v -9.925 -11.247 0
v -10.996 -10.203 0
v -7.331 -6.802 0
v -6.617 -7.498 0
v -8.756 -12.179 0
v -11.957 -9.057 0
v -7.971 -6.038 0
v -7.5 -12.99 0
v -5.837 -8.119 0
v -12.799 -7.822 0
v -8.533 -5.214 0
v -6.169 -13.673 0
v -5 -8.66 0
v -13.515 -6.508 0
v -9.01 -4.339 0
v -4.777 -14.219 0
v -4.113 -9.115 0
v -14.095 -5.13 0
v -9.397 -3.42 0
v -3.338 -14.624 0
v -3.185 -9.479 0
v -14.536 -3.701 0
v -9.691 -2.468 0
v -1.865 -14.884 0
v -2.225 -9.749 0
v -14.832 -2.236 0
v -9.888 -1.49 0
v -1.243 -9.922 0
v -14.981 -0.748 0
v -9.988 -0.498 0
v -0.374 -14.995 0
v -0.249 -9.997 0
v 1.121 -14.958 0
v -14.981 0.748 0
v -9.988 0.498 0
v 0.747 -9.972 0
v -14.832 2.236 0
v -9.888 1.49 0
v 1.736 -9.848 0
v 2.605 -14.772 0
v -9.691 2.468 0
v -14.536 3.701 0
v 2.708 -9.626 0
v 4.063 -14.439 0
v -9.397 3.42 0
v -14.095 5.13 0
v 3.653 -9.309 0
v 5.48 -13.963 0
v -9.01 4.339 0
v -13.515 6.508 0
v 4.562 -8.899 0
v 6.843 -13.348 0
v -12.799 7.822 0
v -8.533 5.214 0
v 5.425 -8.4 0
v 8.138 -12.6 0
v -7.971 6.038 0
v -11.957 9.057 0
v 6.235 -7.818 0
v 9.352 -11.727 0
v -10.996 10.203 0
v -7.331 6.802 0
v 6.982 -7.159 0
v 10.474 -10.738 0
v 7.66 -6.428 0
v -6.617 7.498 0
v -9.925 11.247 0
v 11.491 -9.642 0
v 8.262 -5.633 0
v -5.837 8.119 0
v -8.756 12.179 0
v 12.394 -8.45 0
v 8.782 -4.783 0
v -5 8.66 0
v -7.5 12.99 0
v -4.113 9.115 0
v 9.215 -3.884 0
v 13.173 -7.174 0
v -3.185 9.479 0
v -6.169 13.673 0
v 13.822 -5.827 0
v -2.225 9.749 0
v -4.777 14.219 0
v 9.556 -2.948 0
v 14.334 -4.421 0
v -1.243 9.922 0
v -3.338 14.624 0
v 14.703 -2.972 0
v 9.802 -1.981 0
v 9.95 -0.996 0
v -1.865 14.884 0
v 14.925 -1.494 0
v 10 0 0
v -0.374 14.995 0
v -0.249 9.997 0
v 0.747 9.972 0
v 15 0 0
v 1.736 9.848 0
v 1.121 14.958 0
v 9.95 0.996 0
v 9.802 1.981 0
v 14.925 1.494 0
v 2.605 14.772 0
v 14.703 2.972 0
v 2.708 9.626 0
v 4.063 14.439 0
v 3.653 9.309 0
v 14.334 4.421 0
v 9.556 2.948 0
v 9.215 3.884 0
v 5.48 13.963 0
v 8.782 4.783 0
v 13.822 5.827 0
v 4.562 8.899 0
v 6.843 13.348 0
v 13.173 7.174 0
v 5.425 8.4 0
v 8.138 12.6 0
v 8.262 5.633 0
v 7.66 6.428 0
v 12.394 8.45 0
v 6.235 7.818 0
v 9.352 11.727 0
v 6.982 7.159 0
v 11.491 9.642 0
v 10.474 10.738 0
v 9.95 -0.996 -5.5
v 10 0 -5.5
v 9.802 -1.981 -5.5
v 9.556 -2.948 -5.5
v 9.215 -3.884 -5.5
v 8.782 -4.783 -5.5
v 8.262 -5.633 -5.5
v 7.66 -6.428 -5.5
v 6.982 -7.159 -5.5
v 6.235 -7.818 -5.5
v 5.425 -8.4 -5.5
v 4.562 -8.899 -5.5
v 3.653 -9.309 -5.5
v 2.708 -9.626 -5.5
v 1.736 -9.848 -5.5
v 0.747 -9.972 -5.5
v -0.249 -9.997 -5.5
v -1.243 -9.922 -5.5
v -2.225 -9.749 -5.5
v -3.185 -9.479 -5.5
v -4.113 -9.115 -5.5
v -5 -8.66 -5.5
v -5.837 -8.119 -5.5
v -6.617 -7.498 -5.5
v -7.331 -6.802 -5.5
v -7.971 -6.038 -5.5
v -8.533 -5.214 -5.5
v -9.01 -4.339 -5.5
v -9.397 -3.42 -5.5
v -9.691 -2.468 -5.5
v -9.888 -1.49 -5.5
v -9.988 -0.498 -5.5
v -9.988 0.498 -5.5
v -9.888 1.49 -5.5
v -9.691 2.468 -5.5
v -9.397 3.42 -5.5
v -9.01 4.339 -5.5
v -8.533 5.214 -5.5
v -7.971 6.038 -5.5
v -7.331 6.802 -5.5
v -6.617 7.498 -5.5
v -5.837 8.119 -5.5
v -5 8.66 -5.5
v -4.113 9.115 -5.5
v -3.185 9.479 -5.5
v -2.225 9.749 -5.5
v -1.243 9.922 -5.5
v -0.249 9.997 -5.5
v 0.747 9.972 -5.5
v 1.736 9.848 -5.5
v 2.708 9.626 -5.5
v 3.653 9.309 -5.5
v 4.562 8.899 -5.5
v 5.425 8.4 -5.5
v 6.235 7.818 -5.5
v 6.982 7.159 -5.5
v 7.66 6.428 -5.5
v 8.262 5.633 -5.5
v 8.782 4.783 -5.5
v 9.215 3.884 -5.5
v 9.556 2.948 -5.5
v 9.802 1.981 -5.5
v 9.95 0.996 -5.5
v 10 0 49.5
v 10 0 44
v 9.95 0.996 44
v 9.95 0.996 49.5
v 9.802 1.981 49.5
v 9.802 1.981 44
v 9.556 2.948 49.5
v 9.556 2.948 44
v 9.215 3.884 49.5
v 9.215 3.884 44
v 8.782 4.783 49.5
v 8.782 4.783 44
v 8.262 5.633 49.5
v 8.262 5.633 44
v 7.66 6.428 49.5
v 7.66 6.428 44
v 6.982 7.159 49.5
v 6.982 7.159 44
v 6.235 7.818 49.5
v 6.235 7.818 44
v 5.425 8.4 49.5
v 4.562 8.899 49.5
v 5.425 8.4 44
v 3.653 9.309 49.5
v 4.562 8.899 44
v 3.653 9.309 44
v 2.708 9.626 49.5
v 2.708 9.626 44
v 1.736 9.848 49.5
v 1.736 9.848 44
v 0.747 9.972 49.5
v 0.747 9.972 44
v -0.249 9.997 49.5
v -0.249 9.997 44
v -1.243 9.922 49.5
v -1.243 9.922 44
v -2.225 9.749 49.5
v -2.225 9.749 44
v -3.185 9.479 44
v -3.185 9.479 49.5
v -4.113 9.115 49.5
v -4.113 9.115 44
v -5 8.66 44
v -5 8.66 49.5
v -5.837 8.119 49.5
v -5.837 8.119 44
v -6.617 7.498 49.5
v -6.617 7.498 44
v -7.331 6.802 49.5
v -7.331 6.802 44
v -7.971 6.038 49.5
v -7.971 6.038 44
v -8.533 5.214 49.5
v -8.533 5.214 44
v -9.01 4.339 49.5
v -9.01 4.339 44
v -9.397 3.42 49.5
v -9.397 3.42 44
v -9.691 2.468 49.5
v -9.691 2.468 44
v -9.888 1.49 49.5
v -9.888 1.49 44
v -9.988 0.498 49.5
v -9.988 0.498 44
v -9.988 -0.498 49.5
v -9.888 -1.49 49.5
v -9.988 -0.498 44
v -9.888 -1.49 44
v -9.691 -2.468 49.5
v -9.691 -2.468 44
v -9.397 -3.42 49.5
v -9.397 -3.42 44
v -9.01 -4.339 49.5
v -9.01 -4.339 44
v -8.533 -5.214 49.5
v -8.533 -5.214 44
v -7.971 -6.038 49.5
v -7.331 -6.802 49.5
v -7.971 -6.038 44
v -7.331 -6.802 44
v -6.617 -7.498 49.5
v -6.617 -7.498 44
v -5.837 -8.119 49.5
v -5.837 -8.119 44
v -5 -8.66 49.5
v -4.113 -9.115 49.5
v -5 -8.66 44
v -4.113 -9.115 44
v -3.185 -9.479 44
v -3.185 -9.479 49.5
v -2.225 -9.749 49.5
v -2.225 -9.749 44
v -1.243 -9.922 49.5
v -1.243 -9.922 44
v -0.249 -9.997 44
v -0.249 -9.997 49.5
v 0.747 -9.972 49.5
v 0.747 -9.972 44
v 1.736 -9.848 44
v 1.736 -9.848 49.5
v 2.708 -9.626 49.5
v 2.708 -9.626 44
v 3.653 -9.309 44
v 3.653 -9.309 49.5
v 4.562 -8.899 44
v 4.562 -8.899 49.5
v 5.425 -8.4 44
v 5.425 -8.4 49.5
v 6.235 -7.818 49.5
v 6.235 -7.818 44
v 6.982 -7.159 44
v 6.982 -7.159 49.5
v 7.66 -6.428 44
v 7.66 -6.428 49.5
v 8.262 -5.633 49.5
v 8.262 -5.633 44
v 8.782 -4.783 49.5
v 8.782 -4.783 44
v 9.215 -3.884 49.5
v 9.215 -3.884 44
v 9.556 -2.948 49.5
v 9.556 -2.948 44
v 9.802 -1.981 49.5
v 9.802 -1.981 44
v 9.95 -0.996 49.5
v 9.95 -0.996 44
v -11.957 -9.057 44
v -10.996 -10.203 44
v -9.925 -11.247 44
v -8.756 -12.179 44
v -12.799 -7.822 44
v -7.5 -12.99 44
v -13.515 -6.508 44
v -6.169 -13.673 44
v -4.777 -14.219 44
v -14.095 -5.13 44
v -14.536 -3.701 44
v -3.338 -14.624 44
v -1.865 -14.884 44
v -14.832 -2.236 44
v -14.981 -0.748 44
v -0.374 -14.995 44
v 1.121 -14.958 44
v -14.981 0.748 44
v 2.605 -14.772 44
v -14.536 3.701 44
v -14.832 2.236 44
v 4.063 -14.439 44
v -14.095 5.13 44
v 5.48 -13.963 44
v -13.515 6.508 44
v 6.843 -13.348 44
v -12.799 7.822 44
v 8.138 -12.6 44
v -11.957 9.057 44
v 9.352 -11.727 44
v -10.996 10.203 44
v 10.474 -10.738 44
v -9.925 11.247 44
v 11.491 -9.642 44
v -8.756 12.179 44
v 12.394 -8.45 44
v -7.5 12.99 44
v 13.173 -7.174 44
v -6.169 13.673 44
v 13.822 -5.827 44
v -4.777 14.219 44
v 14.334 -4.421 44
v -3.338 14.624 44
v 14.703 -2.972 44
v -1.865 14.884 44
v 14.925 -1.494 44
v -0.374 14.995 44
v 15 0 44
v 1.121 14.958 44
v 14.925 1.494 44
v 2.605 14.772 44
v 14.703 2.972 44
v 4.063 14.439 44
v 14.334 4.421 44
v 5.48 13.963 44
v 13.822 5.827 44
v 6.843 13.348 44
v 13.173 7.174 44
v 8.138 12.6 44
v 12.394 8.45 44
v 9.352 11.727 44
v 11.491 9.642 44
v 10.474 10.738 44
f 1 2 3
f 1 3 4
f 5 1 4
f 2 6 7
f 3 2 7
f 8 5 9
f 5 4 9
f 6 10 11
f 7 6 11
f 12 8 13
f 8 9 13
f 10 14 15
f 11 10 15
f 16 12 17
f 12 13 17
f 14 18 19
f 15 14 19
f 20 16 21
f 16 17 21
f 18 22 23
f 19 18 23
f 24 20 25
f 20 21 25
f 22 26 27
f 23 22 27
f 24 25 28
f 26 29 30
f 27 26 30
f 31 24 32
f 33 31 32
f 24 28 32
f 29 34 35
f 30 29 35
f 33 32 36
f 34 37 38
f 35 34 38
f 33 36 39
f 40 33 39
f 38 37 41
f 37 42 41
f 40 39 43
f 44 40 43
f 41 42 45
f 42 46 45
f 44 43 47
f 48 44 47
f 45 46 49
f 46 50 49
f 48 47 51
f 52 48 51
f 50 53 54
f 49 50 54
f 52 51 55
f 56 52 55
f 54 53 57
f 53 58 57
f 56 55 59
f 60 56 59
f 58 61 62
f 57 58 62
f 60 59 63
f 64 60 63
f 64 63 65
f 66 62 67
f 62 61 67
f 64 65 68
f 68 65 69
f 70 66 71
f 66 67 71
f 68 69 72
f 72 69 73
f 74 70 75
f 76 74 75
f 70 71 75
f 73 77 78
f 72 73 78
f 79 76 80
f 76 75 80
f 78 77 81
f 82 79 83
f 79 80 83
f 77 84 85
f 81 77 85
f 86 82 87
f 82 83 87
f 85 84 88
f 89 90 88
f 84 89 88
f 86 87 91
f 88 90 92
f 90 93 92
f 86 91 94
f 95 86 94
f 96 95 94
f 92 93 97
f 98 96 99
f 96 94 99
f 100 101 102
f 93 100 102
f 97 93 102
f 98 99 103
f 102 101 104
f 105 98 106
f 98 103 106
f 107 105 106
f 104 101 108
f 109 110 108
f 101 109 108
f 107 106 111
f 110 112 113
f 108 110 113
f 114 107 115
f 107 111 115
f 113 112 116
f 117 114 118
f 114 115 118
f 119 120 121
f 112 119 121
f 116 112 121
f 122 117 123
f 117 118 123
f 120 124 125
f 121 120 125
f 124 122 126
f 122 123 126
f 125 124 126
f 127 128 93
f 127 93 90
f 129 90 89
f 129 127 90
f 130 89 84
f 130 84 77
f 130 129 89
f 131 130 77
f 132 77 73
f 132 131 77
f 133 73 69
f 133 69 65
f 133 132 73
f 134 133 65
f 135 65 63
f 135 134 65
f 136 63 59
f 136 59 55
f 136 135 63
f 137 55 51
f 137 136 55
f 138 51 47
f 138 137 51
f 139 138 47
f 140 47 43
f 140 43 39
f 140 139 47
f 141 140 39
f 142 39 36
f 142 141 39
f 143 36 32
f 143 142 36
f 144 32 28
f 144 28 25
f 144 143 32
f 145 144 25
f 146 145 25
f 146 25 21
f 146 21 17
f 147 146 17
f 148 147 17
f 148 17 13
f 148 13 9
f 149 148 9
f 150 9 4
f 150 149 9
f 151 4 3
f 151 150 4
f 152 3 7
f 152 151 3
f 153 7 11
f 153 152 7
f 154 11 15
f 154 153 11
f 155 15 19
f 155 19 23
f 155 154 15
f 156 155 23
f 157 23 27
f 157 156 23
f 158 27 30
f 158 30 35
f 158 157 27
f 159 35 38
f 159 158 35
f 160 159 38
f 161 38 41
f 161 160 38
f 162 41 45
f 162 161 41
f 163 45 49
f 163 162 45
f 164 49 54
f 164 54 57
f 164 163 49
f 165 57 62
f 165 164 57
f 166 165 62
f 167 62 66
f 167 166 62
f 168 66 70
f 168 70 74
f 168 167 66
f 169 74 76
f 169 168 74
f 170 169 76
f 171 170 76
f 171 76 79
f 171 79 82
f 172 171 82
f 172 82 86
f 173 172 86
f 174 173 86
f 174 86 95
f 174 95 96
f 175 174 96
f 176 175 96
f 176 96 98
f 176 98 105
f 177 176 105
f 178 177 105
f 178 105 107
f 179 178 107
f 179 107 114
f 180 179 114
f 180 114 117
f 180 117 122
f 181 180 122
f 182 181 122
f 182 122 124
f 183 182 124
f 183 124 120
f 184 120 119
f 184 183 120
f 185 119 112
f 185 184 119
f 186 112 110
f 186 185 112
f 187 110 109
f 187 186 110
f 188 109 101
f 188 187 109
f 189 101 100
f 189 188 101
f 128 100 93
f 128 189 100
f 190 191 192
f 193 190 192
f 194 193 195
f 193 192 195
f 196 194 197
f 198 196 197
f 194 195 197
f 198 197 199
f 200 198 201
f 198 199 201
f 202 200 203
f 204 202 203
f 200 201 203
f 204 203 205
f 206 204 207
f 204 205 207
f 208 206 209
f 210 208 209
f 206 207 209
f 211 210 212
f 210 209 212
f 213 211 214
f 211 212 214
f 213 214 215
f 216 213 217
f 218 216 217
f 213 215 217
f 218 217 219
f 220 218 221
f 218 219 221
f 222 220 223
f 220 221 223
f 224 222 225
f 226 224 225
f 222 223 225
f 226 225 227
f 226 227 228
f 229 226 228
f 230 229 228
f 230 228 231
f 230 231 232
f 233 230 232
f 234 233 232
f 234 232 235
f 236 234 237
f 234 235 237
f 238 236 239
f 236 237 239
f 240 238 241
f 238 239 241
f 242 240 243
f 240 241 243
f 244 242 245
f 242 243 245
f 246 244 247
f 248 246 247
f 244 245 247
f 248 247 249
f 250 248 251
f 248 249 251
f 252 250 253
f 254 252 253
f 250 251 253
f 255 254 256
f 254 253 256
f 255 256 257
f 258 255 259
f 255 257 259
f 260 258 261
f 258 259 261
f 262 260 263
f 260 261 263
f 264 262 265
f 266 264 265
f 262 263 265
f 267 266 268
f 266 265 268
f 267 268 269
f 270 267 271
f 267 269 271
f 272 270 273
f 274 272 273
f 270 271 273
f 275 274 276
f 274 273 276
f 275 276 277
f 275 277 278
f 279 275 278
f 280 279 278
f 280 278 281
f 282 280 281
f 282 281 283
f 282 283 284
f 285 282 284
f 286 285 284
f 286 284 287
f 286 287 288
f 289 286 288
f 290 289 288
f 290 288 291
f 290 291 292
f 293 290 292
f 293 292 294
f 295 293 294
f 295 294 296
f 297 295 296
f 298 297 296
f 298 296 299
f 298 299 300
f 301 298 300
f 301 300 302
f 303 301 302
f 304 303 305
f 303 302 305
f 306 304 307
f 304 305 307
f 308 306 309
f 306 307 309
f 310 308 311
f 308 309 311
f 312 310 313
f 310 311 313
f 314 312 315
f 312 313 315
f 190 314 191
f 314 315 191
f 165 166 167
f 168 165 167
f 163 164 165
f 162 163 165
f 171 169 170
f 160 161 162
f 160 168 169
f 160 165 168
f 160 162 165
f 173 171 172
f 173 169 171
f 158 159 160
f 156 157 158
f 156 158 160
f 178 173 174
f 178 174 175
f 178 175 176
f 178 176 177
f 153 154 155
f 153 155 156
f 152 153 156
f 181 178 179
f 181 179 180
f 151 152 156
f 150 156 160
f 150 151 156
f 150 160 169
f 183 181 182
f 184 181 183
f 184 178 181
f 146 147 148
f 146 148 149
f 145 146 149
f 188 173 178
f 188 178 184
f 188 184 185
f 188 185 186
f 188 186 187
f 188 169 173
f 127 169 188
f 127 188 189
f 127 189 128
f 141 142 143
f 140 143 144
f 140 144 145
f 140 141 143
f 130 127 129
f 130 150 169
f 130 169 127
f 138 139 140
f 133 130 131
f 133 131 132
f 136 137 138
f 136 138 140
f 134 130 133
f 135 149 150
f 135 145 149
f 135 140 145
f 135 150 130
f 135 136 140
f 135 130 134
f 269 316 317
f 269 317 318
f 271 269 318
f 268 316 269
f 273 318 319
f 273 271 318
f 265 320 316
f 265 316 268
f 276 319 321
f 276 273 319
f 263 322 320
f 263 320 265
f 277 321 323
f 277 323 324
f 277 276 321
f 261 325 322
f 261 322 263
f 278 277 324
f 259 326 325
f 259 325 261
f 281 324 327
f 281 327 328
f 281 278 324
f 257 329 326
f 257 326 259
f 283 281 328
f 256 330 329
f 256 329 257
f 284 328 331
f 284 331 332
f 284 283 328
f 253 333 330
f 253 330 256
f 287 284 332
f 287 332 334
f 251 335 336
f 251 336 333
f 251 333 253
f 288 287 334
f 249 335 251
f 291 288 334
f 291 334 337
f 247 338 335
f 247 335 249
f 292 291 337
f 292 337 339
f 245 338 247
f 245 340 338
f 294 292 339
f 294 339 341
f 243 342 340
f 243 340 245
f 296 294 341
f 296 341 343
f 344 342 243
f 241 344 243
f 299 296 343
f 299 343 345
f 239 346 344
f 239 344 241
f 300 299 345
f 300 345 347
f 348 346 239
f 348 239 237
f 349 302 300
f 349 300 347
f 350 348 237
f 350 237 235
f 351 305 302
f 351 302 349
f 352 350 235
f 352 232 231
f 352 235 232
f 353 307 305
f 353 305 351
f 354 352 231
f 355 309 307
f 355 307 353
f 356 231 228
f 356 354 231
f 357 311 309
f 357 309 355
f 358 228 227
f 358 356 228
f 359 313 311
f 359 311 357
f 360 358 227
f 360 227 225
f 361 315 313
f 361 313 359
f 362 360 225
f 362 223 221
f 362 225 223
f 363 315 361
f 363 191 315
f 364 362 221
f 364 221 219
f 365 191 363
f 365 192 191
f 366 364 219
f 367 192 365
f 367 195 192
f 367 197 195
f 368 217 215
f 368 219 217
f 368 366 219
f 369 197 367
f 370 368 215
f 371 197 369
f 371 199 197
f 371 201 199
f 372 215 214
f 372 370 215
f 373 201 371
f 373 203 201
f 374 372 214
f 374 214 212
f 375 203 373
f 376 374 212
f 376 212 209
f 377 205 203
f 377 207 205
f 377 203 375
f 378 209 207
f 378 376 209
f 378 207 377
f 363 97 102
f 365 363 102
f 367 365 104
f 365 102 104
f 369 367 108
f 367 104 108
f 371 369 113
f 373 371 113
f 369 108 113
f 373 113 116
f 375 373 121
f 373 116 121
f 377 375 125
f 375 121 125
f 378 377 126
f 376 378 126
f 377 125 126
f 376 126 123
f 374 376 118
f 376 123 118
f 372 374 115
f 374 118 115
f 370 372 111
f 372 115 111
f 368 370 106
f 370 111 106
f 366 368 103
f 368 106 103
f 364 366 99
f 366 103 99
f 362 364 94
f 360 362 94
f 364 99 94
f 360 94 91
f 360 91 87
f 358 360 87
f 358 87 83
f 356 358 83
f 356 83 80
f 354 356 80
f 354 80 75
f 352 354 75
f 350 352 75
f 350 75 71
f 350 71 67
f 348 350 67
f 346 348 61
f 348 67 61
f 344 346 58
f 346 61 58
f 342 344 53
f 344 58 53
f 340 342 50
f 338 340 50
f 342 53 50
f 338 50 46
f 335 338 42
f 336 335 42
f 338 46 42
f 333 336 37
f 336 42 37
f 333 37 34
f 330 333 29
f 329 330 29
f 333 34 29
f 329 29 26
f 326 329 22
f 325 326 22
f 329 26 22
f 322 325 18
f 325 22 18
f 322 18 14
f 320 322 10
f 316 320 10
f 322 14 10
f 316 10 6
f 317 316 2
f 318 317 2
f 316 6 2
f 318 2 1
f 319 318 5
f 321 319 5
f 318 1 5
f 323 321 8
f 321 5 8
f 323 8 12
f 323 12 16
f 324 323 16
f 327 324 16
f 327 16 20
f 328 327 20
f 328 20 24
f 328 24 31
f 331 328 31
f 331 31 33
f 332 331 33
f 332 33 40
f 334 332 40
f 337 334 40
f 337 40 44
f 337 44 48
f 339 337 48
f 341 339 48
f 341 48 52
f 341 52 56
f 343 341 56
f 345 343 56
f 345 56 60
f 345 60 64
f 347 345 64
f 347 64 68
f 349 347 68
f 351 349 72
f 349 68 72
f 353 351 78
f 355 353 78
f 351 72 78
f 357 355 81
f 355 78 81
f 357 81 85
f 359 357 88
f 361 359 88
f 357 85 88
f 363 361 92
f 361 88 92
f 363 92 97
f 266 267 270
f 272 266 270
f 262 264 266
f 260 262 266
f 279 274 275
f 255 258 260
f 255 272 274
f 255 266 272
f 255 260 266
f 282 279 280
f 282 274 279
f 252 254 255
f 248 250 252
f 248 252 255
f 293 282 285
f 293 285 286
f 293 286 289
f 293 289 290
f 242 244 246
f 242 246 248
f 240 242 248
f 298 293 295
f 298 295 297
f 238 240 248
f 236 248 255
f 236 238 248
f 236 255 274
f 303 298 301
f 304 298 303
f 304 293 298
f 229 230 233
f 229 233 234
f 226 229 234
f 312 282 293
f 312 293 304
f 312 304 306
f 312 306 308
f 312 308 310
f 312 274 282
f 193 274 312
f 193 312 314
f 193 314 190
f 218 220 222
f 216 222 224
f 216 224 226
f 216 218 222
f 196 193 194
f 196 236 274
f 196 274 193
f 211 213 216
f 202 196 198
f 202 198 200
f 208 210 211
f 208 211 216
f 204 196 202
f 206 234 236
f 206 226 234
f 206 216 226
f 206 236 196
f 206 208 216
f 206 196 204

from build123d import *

# Parameters (mm, degrees)
SKETCH1_R           = 15
BOSS_EXTRUDE1_DEPTH = 44
SKETCH4_R           = 10
BOSS_EXTRUDE2_DEPTH = 5.5
BOSS_EXTRUDE3_START = 5.5
SKETCH5_R           = 10
BOSS_EXTRUDE3_DEPTH = 5.5


with BuildPart() as part:
    # Sketch1 → Boss-Extrude1 (new body)
    with BuildSketch(Plane.XY):
        Circle(SKETCH1_R)
    extrude(amount=BOSS_EXTRUDE1_DEPTH)

    # Sketch4 → Boss-Extrude2 (add)
    with BuildSketch(Plane.XY.offset(44)):
        Circle(SKETCH4_R)
    extrude(amount=BOSS_EXTRUDE2_DEPTH)

    # Sketch5 → Boss-Extrude3 (add)
    with BuildSketch(Plane(origin=(0, 0, 0), x_dir=(-1, 0, 0), z_dir=(0, 0, -1)).offset(BOSS_EXTRUDE3_START)):
        with Locations(Location((0, 0, 0), (0, 0, 180))):
            Circle(SKETCH5_R)
    extrude(amount=-BOSS_EXTRUDE3_DEPTH)


solid = part.part
